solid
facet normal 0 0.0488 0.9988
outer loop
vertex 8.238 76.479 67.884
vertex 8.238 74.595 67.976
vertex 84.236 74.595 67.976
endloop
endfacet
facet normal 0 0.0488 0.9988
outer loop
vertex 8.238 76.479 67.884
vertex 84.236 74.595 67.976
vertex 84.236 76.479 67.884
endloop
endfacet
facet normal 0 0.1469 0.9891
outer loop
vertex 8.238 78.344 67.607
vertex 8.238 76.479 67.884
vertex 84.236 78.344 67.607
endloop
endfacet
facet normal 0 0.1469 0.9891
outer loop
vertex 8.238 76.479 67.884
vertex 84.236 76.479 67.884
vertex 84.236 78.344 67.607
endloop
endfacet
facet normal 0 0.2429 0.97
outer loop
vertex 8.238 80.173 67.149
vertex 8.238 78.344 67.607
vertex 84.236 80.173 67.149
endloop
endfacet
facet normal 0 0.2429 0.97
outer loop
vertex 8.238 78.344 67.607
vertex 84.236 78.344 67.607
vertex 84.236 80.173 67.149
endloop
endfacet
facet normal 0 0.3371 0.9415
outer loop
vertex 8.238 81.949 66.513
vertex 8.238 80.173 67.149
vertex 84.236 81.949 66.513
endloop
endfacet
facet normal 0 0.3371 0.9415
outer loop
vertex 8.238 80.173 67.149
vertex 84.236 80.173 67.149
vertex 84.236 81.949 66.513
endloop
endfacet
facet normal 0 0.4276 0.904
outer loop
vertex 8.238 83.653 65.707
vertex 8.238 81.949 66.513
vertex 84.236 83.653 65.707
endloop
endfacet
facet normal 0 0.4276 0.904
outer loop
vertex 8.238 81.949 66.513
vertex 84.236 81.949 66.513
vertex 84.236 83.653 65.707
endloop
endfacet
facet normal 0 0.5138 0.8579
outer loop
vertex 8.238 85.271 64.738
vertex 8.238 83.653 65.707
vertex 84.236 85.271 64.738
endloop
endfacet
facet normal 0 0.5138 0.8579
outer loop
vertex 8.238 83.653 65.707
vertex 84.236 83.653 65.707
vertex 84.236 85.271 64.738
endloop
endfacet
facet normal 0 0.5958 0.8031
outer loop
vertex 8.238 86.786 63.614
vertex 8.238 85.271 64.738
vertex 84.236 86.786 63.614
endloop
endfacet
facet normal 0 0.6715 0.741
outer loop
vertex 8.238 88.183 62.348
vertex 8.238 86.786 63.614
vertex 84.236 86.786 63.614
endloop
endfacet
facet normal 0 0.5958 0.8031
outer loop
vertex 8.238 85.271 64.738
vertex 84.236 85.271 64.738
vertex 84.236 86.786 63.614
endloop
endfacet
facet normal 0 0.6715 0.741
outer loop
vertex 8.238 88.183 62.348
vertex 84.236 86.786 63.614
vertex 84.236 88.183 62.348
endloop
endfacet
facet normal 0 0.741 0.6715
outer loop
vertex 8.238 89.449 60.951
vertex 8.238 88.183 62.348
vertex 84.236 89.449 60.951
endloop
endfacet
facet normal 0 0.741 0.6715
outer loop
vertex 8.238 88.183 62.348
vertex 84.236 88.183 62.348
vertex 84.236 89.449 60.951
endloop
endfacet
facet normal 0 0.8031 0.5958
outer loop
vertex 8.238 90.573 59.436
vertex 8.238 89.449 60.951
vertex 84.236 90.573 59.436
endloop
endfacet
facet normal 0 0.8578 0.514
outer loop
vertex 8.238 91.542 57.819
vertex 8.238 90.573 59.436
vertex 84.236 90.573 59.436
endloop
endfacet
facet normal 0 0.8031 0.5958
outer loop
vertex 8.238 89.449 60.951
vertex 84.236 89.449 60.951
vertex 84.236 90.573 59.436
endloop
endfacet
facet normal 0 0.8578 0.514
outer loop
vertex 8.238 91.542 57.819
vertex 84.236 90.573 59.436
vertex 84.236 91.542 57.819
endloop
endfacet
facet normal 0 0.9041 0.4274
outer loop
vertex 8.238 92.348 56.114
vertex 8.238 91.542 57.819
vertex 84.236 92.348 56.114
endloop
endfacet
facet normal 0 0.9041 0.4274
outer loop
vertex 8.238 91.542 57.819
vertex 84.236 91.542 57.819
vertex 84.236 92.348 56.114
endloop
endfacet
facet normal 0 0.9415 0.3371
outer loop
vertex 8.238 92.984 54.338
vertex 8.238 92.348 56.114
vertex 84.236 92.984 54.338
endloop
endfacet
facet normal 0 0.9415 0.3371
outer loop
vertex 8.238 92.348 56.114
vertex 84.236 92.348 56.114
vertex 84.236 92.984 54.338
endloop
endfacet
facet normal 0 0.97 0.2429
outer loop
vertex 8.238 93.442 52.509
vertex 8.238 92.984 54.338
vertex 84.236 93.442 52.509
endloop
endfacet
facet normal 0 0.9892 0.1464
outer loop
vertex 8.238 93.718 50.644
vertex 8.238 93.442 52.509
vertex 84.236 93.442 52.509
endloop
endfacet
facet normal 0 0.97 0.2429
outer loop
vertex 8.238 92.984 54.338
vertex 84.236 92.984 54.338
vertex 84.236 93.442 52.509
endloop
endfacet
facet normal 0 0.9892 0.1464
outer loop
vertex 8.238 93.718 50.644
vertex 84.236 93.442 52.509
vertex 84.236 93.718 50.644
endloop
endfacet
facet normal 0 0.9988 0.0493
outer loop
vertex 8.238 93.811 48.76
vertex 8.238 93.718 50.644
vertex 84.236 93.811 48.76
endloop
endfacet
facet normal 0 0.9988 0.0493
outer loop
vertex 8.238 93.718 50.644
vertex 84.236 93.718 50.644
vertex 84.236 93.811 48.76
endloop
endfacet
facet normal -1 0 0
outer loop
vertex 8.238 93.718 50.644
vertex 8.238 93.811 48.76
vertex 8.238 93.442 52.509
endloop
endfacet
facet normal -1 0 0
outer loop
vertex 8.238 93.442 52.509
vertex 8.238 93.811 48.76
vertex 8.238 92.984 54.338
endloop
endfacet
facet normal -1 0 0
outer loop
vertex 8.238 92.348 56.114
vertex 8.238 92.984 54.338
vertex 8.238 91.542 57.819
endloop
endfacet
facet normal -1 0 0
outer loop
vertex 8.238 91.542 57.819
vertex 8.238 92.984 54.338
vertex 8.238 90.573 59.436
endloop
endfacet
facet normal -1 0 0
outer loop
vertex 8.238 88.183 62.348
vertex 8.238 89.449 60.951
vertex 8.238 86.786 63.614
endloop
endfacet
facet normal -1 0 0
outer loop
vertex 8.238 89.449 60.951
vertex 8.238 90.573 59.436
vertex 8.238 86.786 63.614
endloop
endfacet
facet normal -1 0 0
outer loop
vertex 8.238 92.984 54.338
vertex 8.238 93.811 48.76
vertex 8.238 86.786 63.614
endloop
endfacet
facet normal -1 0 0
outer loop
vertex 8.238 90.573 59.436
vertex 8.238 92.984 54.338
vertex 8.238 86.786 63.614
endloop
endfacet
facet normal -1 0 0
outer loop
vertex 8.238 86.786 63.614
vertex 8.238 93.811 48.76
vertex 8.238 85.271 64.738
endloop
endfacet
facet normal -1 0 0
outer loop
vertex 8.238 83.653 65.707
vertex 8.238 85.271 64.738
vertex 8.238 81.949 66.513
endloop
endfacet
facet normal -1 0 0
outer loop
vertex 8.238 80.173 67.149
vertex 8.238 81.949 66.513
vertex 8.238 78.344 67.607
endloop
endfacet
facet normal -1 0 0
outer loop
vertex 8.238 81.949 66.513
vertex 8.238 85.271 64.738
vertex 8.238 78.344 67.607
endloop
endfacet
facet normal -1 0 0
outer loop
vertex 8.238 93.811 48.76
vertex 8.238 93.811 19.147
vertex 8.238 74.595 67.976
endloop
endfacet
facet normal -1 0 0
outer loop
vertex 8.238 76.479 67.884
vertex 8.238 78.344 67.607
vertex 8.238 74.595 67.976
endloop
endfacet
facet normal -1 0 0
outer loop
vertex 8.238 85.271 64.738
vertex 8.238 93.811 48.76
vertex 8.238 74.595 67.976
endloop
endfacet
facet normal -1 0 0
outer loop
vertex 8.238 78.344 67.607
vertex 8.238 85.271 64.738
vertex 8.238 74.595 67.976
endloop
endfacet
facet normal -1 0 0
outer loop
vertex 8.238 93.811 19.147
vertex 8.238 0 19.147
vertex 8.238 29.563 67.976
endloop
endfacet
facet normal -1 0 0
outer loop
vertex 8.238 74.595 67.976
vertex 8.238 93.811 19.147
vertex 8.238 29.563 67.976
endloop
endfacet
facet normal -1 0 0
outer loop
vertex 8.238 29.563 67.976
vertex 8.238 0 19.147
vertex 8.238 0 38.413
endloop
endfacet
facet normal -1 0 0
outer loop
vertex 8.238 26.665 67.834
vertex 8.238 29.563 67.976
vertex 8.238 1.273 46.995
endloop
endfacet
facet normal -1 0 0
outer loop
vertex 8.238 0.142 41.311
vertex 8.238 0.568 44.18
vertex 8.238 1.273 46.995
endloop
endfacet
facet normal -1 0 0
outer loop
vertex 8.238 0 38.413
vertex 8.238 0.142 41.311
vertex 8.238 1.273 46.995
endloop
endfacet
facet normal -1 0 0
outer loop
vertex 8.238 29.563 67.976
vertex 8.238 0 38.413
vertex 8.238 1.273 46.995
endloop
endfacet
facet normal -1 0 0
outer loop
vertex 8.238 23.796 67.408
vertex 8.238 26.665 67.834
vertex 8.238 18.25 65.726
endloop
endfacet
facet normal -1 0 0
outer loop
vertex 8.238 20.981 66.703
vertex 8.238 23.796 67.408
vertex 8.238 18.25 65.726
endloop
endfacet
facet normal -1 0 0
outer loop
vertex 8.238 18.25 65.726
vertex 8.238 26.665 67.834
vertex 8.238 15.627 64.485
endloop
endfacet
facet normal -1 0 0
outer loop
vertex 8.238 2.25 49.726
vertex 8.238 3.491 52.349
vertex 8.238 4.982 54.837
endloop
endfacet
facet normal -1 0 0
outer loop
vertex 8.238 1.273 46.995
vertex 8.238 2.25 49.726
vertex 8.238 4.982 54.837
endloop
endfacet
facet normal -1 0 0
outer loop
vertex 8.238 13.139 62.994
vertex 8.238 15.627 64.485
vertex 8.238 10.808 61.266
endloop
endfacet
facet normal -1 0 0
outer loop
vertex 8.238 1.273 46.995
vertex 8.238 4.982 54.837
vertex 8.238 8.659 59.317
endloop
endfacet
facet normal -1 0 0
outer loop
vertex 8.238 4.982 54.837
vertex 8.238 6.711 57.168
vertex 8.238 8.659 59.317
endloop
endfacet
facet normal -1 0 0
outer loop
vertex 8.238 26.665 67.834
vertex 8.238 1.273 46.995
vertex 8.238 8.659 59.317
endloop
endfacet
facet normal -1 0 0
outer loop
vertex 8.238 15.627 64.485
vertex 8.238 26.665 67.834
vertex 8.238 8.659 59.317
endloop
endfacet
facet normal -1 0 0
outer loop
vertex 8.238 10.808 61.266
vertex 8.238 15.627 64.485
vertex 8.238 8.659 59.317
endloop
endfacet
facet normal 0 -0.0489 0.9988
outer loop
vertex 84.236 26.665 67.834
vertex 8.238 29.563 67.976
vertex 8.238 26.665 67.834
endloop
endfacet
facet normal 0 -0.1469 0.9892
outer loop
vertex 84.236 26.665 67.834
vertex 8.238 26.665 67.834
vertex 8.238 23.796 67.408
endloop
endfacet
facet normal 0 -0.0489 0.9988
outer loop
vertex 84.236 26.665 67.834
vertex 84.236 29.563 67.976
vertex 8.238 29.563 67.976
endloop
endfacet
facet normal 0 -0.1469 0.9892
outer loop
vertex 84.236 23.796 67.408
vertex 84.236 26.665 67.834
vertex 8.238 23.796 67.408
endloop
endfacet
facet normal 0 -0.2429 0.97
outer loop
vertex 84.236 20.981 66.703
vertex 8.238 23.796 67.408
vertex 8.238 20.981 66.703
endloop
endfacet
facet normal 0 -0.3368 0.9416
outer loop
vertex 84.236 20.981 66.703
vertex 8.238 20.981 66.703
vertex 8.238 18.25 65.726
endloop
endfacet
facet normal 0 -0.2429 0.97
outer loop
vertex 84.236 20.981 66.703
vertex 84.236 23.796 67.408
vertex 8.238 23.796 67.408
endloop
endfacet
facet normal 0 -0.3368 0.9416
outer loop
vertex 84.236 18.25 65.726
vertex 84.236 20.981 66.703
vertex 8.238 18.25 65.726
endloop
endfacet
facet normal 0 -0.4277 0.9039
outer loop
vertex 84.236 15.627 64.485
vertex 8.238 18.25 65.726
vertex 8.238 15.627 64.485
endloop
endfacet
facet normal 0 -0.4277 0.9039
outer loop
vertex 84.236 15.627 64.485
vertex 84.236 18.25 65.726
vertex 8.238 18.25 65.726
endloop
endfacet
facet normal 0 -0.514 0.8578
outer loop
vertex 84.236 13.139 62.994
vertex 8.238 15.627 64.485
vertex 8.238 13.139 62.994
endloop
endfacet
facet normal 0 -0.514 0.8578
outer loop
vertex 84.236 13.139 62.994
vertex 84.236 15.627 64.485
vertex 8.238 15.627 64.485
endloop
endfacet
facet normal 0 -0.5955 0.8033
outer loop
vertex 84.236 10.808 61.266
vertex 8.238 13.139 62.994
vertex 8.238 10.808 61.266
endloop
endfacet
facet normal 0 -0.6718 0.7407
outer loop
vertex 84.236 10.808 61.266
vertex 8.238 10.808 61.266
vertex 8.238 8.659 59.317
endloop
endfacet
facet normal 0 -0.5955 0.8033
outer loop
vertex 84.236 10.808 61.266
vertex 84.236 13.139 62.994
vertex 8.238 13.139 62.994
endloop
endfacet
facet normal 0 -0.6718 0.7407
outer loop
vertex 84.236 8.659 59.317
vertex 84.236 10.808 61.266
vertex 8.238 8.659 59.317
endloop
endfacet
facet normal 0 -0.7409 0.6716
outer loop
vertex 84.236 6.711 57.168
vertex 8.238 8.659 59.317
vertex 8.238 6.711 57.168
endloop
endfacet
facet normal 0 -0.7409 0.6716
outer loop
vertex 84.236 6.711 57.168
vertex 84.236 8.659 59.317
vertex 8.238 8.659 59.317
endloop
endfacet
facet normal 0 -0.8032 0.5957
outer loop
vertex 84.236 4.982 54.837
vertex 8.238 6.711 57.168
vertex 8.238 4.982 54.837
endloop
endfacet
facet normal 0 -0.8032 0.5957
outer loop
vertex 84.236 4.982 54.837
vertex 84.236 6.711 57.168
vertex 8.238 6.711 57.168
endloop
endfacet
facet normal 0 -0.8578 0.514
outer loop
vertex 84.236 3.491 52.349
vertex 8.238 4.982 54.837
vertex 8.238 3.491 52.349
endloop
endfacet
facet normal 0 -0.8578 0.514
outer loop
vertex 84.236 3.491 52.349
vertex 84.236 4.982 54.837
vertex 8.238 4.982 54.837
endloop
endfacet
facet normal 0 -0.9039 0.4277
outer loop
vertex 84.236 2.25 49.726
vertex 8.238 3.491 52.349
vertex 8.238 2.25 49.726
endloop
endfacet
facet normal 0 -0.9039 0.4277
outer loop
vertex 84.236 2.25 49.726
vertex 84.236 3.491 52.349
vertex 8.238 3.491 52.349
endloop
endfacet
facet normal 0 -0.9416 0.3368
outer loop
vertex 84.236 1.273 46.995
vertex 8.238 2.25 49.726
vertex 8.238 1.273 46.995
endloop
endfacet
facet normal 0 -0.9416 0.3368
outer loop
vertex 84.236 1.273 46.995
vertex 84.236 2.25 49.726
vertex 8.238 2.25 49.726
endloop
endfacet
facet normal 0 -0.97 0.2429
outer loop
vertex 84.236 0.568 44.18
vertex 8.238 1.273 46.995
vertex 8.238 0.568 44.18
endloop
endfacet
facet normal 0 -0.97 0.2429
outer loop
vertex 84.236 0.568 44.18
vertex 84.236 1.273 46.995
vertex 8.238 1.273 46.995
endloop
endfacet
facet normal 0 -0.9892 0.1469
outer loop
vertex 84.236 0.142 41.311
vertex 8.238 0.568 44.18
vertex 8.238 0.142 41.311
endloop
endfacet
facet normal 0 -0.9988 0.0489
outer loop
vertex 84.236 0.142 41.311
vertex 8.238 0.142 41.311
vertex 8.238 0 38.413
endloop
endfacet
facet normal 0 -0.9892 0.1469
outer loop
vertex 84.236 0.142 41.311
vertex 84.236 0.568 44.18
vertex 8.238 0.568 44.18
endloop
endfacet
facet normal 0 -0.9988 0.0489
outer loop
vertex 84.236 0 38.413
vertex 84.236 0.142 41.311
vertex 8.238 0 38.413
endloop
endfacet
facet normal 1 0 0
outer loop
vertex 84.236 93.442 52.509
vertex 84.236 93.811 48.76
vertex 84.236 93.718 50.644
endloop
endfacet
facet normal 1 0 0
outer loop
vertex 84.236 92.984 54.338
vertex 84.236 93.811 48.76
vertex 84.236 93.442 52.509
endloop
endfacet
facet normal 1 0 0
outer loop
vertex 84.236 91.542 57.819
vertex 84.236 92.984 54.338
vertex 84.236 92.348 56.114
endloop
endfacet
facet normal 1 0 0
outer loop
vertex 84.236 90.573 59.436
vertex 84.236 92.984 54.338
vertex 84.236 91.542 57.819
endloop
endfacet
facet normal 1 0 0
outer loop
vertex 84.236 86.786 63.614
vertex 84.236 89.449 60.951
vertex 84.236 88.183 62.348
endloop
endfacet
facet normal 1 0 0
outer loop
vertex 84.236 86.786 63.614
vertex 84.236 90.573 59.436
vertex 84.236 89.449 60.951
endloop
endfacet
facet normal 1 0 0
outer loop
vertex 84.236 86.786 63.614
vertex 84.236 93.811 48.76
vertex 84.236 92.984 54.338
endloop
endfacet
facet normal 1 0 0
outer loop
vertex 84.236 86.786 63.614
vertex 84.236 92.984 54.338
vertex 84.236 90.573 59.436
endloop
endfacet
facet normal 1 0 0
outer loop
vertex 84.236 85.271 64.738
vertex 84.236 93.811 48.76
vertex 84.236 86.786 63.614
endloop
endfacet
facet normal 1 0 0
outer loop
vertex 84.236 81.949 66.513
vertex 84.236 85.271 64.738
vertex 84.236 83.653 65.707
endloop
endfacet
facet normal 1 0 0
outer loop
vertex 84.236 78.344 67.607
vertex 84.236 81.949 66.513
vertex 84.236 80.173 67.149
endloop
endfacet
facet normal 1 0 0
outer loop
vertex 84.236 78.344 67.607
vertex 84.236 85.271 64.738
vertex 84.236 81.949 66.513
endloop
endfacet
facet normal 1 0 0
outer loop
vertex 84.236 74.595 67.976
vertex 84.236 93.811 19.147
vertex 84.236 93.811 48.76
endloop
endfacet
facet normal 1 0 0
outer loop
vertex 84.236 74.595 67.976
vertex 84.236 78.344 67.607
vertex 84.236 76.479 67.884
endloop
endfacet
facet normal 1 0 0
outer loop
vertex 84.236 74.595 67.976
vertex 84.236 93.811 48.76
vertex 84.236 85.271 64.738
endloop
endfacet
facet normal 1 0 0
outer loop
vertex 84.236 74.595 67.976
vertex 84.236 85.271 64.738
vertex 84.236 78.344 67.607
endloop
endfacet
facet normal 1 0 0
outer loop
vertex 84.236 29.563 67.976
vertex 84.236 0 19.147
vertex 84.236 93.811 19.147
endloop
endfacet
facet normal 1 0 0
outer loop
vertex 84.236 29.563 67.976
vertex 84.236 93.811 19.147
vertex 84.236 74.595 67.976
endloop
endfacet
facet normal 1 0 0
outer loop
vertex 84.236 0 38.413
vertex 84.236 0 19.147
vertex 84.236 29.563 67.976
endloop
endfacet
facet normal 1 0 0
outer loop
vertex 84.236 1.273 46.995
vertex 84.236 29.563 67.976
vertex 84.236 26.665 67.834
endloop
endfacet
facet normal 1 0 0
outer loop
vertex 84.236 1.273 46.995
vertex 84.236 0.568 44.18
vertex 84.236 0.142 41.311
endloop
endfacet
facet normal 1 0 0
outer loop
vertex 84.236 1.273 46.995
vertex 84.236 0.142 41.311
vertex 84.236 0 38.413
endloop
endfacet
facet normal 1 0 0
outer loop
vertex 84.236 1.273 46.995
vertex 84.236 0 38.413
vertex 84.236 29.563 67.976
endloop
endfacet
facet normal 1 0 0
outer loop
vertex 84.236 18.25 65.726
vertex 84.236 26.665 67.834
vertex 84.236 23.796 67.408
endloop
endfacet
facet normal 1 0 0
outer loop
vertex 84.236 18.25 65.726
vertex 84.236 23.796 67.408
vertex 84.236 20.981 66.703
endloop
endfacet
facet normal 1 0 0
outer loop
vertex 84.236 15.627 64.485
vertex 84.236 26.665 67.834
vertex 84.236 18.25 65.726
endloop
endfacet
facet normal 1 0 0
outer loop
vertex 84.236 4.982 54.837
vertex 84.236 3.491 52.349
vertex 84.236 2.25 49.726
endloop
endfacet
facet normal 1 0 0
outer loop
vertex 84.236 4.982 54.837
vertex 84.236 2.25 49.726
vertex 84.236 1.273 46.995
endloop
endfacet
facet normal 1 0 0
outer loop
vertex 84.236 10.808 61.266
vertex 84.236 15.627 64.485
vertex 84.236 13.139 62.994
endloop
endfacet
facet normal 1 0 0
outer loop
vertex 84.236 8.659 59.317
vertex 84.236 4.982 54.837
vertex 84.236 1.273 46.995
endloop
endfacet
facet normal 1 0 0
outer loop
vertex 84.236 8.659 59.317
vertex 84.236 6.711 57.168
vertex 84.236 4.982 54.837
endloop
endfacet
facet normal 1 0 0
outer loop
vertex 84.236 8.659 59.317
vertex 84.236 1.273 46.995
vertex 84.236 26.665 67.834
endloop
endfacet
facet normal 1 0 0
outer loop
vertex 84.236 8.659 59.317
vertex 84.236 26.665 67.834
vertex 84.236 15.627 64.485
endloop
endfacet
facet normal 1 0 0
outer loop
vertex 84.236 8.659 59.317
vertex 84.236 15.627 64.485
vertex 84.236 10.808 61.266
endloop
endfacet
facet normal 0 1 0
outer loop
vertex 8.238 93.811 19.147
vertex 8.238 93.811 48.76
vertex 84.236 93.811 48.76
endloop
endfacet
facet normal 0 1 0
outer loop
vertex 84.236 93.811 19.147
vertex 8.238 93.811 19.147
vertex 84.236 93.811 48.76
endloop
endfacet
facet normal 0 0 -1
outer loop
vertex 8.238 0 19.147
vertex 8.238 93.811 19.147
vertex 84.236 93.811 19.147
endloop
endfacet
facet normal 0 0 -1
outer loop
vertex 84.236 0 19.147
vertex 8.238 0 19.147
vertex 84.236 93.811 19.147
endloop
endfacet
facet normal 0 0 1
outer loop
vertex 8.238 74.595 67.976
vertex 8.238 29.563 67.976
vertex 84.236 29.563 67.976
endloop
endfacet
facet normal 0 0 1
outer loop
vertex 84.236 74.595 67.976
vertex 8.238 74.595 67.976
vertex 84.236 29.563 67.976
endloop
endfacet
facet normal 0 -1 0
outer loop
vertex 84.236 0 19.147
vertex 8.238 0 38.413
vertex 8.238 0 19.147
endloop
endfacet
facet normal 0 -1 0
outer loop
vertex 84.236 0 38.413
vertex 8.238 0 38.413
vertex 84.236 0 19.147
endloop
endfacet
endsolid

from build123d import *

# Parameters (mm, degrees)
F0_W     = 75.997784
F0_H     = 48.82941
F1_DEPTH = 93.811005
F2_R     = 19.21578
F3_R     = 29.563082


with BuildPart() as f1:
    # F0 (on Front) → F1 (new body)
    with BuildSketch(Plane.XZ):
        with Locations((46.23688, 43.56139)):
            Rectangle(F0_W, F0_H)
    extrude(amount=-F1_DEPTH)

    # F2
    f2_edges = [f1.edges().sort_by_distance(p)[0] for p in [
        (46.23688, 93.811005, 67.976095),
    ]]
    fillet(f2_edges, radius=F2_R)

    # F3
    f3_edges = [f1.edges().sort_by_distance(p)[0] for p in [
        (46.23688, 0, 67.976095),
    ]]
    fillet(f3_edges, radius=F3_R)


solid = f1.part
